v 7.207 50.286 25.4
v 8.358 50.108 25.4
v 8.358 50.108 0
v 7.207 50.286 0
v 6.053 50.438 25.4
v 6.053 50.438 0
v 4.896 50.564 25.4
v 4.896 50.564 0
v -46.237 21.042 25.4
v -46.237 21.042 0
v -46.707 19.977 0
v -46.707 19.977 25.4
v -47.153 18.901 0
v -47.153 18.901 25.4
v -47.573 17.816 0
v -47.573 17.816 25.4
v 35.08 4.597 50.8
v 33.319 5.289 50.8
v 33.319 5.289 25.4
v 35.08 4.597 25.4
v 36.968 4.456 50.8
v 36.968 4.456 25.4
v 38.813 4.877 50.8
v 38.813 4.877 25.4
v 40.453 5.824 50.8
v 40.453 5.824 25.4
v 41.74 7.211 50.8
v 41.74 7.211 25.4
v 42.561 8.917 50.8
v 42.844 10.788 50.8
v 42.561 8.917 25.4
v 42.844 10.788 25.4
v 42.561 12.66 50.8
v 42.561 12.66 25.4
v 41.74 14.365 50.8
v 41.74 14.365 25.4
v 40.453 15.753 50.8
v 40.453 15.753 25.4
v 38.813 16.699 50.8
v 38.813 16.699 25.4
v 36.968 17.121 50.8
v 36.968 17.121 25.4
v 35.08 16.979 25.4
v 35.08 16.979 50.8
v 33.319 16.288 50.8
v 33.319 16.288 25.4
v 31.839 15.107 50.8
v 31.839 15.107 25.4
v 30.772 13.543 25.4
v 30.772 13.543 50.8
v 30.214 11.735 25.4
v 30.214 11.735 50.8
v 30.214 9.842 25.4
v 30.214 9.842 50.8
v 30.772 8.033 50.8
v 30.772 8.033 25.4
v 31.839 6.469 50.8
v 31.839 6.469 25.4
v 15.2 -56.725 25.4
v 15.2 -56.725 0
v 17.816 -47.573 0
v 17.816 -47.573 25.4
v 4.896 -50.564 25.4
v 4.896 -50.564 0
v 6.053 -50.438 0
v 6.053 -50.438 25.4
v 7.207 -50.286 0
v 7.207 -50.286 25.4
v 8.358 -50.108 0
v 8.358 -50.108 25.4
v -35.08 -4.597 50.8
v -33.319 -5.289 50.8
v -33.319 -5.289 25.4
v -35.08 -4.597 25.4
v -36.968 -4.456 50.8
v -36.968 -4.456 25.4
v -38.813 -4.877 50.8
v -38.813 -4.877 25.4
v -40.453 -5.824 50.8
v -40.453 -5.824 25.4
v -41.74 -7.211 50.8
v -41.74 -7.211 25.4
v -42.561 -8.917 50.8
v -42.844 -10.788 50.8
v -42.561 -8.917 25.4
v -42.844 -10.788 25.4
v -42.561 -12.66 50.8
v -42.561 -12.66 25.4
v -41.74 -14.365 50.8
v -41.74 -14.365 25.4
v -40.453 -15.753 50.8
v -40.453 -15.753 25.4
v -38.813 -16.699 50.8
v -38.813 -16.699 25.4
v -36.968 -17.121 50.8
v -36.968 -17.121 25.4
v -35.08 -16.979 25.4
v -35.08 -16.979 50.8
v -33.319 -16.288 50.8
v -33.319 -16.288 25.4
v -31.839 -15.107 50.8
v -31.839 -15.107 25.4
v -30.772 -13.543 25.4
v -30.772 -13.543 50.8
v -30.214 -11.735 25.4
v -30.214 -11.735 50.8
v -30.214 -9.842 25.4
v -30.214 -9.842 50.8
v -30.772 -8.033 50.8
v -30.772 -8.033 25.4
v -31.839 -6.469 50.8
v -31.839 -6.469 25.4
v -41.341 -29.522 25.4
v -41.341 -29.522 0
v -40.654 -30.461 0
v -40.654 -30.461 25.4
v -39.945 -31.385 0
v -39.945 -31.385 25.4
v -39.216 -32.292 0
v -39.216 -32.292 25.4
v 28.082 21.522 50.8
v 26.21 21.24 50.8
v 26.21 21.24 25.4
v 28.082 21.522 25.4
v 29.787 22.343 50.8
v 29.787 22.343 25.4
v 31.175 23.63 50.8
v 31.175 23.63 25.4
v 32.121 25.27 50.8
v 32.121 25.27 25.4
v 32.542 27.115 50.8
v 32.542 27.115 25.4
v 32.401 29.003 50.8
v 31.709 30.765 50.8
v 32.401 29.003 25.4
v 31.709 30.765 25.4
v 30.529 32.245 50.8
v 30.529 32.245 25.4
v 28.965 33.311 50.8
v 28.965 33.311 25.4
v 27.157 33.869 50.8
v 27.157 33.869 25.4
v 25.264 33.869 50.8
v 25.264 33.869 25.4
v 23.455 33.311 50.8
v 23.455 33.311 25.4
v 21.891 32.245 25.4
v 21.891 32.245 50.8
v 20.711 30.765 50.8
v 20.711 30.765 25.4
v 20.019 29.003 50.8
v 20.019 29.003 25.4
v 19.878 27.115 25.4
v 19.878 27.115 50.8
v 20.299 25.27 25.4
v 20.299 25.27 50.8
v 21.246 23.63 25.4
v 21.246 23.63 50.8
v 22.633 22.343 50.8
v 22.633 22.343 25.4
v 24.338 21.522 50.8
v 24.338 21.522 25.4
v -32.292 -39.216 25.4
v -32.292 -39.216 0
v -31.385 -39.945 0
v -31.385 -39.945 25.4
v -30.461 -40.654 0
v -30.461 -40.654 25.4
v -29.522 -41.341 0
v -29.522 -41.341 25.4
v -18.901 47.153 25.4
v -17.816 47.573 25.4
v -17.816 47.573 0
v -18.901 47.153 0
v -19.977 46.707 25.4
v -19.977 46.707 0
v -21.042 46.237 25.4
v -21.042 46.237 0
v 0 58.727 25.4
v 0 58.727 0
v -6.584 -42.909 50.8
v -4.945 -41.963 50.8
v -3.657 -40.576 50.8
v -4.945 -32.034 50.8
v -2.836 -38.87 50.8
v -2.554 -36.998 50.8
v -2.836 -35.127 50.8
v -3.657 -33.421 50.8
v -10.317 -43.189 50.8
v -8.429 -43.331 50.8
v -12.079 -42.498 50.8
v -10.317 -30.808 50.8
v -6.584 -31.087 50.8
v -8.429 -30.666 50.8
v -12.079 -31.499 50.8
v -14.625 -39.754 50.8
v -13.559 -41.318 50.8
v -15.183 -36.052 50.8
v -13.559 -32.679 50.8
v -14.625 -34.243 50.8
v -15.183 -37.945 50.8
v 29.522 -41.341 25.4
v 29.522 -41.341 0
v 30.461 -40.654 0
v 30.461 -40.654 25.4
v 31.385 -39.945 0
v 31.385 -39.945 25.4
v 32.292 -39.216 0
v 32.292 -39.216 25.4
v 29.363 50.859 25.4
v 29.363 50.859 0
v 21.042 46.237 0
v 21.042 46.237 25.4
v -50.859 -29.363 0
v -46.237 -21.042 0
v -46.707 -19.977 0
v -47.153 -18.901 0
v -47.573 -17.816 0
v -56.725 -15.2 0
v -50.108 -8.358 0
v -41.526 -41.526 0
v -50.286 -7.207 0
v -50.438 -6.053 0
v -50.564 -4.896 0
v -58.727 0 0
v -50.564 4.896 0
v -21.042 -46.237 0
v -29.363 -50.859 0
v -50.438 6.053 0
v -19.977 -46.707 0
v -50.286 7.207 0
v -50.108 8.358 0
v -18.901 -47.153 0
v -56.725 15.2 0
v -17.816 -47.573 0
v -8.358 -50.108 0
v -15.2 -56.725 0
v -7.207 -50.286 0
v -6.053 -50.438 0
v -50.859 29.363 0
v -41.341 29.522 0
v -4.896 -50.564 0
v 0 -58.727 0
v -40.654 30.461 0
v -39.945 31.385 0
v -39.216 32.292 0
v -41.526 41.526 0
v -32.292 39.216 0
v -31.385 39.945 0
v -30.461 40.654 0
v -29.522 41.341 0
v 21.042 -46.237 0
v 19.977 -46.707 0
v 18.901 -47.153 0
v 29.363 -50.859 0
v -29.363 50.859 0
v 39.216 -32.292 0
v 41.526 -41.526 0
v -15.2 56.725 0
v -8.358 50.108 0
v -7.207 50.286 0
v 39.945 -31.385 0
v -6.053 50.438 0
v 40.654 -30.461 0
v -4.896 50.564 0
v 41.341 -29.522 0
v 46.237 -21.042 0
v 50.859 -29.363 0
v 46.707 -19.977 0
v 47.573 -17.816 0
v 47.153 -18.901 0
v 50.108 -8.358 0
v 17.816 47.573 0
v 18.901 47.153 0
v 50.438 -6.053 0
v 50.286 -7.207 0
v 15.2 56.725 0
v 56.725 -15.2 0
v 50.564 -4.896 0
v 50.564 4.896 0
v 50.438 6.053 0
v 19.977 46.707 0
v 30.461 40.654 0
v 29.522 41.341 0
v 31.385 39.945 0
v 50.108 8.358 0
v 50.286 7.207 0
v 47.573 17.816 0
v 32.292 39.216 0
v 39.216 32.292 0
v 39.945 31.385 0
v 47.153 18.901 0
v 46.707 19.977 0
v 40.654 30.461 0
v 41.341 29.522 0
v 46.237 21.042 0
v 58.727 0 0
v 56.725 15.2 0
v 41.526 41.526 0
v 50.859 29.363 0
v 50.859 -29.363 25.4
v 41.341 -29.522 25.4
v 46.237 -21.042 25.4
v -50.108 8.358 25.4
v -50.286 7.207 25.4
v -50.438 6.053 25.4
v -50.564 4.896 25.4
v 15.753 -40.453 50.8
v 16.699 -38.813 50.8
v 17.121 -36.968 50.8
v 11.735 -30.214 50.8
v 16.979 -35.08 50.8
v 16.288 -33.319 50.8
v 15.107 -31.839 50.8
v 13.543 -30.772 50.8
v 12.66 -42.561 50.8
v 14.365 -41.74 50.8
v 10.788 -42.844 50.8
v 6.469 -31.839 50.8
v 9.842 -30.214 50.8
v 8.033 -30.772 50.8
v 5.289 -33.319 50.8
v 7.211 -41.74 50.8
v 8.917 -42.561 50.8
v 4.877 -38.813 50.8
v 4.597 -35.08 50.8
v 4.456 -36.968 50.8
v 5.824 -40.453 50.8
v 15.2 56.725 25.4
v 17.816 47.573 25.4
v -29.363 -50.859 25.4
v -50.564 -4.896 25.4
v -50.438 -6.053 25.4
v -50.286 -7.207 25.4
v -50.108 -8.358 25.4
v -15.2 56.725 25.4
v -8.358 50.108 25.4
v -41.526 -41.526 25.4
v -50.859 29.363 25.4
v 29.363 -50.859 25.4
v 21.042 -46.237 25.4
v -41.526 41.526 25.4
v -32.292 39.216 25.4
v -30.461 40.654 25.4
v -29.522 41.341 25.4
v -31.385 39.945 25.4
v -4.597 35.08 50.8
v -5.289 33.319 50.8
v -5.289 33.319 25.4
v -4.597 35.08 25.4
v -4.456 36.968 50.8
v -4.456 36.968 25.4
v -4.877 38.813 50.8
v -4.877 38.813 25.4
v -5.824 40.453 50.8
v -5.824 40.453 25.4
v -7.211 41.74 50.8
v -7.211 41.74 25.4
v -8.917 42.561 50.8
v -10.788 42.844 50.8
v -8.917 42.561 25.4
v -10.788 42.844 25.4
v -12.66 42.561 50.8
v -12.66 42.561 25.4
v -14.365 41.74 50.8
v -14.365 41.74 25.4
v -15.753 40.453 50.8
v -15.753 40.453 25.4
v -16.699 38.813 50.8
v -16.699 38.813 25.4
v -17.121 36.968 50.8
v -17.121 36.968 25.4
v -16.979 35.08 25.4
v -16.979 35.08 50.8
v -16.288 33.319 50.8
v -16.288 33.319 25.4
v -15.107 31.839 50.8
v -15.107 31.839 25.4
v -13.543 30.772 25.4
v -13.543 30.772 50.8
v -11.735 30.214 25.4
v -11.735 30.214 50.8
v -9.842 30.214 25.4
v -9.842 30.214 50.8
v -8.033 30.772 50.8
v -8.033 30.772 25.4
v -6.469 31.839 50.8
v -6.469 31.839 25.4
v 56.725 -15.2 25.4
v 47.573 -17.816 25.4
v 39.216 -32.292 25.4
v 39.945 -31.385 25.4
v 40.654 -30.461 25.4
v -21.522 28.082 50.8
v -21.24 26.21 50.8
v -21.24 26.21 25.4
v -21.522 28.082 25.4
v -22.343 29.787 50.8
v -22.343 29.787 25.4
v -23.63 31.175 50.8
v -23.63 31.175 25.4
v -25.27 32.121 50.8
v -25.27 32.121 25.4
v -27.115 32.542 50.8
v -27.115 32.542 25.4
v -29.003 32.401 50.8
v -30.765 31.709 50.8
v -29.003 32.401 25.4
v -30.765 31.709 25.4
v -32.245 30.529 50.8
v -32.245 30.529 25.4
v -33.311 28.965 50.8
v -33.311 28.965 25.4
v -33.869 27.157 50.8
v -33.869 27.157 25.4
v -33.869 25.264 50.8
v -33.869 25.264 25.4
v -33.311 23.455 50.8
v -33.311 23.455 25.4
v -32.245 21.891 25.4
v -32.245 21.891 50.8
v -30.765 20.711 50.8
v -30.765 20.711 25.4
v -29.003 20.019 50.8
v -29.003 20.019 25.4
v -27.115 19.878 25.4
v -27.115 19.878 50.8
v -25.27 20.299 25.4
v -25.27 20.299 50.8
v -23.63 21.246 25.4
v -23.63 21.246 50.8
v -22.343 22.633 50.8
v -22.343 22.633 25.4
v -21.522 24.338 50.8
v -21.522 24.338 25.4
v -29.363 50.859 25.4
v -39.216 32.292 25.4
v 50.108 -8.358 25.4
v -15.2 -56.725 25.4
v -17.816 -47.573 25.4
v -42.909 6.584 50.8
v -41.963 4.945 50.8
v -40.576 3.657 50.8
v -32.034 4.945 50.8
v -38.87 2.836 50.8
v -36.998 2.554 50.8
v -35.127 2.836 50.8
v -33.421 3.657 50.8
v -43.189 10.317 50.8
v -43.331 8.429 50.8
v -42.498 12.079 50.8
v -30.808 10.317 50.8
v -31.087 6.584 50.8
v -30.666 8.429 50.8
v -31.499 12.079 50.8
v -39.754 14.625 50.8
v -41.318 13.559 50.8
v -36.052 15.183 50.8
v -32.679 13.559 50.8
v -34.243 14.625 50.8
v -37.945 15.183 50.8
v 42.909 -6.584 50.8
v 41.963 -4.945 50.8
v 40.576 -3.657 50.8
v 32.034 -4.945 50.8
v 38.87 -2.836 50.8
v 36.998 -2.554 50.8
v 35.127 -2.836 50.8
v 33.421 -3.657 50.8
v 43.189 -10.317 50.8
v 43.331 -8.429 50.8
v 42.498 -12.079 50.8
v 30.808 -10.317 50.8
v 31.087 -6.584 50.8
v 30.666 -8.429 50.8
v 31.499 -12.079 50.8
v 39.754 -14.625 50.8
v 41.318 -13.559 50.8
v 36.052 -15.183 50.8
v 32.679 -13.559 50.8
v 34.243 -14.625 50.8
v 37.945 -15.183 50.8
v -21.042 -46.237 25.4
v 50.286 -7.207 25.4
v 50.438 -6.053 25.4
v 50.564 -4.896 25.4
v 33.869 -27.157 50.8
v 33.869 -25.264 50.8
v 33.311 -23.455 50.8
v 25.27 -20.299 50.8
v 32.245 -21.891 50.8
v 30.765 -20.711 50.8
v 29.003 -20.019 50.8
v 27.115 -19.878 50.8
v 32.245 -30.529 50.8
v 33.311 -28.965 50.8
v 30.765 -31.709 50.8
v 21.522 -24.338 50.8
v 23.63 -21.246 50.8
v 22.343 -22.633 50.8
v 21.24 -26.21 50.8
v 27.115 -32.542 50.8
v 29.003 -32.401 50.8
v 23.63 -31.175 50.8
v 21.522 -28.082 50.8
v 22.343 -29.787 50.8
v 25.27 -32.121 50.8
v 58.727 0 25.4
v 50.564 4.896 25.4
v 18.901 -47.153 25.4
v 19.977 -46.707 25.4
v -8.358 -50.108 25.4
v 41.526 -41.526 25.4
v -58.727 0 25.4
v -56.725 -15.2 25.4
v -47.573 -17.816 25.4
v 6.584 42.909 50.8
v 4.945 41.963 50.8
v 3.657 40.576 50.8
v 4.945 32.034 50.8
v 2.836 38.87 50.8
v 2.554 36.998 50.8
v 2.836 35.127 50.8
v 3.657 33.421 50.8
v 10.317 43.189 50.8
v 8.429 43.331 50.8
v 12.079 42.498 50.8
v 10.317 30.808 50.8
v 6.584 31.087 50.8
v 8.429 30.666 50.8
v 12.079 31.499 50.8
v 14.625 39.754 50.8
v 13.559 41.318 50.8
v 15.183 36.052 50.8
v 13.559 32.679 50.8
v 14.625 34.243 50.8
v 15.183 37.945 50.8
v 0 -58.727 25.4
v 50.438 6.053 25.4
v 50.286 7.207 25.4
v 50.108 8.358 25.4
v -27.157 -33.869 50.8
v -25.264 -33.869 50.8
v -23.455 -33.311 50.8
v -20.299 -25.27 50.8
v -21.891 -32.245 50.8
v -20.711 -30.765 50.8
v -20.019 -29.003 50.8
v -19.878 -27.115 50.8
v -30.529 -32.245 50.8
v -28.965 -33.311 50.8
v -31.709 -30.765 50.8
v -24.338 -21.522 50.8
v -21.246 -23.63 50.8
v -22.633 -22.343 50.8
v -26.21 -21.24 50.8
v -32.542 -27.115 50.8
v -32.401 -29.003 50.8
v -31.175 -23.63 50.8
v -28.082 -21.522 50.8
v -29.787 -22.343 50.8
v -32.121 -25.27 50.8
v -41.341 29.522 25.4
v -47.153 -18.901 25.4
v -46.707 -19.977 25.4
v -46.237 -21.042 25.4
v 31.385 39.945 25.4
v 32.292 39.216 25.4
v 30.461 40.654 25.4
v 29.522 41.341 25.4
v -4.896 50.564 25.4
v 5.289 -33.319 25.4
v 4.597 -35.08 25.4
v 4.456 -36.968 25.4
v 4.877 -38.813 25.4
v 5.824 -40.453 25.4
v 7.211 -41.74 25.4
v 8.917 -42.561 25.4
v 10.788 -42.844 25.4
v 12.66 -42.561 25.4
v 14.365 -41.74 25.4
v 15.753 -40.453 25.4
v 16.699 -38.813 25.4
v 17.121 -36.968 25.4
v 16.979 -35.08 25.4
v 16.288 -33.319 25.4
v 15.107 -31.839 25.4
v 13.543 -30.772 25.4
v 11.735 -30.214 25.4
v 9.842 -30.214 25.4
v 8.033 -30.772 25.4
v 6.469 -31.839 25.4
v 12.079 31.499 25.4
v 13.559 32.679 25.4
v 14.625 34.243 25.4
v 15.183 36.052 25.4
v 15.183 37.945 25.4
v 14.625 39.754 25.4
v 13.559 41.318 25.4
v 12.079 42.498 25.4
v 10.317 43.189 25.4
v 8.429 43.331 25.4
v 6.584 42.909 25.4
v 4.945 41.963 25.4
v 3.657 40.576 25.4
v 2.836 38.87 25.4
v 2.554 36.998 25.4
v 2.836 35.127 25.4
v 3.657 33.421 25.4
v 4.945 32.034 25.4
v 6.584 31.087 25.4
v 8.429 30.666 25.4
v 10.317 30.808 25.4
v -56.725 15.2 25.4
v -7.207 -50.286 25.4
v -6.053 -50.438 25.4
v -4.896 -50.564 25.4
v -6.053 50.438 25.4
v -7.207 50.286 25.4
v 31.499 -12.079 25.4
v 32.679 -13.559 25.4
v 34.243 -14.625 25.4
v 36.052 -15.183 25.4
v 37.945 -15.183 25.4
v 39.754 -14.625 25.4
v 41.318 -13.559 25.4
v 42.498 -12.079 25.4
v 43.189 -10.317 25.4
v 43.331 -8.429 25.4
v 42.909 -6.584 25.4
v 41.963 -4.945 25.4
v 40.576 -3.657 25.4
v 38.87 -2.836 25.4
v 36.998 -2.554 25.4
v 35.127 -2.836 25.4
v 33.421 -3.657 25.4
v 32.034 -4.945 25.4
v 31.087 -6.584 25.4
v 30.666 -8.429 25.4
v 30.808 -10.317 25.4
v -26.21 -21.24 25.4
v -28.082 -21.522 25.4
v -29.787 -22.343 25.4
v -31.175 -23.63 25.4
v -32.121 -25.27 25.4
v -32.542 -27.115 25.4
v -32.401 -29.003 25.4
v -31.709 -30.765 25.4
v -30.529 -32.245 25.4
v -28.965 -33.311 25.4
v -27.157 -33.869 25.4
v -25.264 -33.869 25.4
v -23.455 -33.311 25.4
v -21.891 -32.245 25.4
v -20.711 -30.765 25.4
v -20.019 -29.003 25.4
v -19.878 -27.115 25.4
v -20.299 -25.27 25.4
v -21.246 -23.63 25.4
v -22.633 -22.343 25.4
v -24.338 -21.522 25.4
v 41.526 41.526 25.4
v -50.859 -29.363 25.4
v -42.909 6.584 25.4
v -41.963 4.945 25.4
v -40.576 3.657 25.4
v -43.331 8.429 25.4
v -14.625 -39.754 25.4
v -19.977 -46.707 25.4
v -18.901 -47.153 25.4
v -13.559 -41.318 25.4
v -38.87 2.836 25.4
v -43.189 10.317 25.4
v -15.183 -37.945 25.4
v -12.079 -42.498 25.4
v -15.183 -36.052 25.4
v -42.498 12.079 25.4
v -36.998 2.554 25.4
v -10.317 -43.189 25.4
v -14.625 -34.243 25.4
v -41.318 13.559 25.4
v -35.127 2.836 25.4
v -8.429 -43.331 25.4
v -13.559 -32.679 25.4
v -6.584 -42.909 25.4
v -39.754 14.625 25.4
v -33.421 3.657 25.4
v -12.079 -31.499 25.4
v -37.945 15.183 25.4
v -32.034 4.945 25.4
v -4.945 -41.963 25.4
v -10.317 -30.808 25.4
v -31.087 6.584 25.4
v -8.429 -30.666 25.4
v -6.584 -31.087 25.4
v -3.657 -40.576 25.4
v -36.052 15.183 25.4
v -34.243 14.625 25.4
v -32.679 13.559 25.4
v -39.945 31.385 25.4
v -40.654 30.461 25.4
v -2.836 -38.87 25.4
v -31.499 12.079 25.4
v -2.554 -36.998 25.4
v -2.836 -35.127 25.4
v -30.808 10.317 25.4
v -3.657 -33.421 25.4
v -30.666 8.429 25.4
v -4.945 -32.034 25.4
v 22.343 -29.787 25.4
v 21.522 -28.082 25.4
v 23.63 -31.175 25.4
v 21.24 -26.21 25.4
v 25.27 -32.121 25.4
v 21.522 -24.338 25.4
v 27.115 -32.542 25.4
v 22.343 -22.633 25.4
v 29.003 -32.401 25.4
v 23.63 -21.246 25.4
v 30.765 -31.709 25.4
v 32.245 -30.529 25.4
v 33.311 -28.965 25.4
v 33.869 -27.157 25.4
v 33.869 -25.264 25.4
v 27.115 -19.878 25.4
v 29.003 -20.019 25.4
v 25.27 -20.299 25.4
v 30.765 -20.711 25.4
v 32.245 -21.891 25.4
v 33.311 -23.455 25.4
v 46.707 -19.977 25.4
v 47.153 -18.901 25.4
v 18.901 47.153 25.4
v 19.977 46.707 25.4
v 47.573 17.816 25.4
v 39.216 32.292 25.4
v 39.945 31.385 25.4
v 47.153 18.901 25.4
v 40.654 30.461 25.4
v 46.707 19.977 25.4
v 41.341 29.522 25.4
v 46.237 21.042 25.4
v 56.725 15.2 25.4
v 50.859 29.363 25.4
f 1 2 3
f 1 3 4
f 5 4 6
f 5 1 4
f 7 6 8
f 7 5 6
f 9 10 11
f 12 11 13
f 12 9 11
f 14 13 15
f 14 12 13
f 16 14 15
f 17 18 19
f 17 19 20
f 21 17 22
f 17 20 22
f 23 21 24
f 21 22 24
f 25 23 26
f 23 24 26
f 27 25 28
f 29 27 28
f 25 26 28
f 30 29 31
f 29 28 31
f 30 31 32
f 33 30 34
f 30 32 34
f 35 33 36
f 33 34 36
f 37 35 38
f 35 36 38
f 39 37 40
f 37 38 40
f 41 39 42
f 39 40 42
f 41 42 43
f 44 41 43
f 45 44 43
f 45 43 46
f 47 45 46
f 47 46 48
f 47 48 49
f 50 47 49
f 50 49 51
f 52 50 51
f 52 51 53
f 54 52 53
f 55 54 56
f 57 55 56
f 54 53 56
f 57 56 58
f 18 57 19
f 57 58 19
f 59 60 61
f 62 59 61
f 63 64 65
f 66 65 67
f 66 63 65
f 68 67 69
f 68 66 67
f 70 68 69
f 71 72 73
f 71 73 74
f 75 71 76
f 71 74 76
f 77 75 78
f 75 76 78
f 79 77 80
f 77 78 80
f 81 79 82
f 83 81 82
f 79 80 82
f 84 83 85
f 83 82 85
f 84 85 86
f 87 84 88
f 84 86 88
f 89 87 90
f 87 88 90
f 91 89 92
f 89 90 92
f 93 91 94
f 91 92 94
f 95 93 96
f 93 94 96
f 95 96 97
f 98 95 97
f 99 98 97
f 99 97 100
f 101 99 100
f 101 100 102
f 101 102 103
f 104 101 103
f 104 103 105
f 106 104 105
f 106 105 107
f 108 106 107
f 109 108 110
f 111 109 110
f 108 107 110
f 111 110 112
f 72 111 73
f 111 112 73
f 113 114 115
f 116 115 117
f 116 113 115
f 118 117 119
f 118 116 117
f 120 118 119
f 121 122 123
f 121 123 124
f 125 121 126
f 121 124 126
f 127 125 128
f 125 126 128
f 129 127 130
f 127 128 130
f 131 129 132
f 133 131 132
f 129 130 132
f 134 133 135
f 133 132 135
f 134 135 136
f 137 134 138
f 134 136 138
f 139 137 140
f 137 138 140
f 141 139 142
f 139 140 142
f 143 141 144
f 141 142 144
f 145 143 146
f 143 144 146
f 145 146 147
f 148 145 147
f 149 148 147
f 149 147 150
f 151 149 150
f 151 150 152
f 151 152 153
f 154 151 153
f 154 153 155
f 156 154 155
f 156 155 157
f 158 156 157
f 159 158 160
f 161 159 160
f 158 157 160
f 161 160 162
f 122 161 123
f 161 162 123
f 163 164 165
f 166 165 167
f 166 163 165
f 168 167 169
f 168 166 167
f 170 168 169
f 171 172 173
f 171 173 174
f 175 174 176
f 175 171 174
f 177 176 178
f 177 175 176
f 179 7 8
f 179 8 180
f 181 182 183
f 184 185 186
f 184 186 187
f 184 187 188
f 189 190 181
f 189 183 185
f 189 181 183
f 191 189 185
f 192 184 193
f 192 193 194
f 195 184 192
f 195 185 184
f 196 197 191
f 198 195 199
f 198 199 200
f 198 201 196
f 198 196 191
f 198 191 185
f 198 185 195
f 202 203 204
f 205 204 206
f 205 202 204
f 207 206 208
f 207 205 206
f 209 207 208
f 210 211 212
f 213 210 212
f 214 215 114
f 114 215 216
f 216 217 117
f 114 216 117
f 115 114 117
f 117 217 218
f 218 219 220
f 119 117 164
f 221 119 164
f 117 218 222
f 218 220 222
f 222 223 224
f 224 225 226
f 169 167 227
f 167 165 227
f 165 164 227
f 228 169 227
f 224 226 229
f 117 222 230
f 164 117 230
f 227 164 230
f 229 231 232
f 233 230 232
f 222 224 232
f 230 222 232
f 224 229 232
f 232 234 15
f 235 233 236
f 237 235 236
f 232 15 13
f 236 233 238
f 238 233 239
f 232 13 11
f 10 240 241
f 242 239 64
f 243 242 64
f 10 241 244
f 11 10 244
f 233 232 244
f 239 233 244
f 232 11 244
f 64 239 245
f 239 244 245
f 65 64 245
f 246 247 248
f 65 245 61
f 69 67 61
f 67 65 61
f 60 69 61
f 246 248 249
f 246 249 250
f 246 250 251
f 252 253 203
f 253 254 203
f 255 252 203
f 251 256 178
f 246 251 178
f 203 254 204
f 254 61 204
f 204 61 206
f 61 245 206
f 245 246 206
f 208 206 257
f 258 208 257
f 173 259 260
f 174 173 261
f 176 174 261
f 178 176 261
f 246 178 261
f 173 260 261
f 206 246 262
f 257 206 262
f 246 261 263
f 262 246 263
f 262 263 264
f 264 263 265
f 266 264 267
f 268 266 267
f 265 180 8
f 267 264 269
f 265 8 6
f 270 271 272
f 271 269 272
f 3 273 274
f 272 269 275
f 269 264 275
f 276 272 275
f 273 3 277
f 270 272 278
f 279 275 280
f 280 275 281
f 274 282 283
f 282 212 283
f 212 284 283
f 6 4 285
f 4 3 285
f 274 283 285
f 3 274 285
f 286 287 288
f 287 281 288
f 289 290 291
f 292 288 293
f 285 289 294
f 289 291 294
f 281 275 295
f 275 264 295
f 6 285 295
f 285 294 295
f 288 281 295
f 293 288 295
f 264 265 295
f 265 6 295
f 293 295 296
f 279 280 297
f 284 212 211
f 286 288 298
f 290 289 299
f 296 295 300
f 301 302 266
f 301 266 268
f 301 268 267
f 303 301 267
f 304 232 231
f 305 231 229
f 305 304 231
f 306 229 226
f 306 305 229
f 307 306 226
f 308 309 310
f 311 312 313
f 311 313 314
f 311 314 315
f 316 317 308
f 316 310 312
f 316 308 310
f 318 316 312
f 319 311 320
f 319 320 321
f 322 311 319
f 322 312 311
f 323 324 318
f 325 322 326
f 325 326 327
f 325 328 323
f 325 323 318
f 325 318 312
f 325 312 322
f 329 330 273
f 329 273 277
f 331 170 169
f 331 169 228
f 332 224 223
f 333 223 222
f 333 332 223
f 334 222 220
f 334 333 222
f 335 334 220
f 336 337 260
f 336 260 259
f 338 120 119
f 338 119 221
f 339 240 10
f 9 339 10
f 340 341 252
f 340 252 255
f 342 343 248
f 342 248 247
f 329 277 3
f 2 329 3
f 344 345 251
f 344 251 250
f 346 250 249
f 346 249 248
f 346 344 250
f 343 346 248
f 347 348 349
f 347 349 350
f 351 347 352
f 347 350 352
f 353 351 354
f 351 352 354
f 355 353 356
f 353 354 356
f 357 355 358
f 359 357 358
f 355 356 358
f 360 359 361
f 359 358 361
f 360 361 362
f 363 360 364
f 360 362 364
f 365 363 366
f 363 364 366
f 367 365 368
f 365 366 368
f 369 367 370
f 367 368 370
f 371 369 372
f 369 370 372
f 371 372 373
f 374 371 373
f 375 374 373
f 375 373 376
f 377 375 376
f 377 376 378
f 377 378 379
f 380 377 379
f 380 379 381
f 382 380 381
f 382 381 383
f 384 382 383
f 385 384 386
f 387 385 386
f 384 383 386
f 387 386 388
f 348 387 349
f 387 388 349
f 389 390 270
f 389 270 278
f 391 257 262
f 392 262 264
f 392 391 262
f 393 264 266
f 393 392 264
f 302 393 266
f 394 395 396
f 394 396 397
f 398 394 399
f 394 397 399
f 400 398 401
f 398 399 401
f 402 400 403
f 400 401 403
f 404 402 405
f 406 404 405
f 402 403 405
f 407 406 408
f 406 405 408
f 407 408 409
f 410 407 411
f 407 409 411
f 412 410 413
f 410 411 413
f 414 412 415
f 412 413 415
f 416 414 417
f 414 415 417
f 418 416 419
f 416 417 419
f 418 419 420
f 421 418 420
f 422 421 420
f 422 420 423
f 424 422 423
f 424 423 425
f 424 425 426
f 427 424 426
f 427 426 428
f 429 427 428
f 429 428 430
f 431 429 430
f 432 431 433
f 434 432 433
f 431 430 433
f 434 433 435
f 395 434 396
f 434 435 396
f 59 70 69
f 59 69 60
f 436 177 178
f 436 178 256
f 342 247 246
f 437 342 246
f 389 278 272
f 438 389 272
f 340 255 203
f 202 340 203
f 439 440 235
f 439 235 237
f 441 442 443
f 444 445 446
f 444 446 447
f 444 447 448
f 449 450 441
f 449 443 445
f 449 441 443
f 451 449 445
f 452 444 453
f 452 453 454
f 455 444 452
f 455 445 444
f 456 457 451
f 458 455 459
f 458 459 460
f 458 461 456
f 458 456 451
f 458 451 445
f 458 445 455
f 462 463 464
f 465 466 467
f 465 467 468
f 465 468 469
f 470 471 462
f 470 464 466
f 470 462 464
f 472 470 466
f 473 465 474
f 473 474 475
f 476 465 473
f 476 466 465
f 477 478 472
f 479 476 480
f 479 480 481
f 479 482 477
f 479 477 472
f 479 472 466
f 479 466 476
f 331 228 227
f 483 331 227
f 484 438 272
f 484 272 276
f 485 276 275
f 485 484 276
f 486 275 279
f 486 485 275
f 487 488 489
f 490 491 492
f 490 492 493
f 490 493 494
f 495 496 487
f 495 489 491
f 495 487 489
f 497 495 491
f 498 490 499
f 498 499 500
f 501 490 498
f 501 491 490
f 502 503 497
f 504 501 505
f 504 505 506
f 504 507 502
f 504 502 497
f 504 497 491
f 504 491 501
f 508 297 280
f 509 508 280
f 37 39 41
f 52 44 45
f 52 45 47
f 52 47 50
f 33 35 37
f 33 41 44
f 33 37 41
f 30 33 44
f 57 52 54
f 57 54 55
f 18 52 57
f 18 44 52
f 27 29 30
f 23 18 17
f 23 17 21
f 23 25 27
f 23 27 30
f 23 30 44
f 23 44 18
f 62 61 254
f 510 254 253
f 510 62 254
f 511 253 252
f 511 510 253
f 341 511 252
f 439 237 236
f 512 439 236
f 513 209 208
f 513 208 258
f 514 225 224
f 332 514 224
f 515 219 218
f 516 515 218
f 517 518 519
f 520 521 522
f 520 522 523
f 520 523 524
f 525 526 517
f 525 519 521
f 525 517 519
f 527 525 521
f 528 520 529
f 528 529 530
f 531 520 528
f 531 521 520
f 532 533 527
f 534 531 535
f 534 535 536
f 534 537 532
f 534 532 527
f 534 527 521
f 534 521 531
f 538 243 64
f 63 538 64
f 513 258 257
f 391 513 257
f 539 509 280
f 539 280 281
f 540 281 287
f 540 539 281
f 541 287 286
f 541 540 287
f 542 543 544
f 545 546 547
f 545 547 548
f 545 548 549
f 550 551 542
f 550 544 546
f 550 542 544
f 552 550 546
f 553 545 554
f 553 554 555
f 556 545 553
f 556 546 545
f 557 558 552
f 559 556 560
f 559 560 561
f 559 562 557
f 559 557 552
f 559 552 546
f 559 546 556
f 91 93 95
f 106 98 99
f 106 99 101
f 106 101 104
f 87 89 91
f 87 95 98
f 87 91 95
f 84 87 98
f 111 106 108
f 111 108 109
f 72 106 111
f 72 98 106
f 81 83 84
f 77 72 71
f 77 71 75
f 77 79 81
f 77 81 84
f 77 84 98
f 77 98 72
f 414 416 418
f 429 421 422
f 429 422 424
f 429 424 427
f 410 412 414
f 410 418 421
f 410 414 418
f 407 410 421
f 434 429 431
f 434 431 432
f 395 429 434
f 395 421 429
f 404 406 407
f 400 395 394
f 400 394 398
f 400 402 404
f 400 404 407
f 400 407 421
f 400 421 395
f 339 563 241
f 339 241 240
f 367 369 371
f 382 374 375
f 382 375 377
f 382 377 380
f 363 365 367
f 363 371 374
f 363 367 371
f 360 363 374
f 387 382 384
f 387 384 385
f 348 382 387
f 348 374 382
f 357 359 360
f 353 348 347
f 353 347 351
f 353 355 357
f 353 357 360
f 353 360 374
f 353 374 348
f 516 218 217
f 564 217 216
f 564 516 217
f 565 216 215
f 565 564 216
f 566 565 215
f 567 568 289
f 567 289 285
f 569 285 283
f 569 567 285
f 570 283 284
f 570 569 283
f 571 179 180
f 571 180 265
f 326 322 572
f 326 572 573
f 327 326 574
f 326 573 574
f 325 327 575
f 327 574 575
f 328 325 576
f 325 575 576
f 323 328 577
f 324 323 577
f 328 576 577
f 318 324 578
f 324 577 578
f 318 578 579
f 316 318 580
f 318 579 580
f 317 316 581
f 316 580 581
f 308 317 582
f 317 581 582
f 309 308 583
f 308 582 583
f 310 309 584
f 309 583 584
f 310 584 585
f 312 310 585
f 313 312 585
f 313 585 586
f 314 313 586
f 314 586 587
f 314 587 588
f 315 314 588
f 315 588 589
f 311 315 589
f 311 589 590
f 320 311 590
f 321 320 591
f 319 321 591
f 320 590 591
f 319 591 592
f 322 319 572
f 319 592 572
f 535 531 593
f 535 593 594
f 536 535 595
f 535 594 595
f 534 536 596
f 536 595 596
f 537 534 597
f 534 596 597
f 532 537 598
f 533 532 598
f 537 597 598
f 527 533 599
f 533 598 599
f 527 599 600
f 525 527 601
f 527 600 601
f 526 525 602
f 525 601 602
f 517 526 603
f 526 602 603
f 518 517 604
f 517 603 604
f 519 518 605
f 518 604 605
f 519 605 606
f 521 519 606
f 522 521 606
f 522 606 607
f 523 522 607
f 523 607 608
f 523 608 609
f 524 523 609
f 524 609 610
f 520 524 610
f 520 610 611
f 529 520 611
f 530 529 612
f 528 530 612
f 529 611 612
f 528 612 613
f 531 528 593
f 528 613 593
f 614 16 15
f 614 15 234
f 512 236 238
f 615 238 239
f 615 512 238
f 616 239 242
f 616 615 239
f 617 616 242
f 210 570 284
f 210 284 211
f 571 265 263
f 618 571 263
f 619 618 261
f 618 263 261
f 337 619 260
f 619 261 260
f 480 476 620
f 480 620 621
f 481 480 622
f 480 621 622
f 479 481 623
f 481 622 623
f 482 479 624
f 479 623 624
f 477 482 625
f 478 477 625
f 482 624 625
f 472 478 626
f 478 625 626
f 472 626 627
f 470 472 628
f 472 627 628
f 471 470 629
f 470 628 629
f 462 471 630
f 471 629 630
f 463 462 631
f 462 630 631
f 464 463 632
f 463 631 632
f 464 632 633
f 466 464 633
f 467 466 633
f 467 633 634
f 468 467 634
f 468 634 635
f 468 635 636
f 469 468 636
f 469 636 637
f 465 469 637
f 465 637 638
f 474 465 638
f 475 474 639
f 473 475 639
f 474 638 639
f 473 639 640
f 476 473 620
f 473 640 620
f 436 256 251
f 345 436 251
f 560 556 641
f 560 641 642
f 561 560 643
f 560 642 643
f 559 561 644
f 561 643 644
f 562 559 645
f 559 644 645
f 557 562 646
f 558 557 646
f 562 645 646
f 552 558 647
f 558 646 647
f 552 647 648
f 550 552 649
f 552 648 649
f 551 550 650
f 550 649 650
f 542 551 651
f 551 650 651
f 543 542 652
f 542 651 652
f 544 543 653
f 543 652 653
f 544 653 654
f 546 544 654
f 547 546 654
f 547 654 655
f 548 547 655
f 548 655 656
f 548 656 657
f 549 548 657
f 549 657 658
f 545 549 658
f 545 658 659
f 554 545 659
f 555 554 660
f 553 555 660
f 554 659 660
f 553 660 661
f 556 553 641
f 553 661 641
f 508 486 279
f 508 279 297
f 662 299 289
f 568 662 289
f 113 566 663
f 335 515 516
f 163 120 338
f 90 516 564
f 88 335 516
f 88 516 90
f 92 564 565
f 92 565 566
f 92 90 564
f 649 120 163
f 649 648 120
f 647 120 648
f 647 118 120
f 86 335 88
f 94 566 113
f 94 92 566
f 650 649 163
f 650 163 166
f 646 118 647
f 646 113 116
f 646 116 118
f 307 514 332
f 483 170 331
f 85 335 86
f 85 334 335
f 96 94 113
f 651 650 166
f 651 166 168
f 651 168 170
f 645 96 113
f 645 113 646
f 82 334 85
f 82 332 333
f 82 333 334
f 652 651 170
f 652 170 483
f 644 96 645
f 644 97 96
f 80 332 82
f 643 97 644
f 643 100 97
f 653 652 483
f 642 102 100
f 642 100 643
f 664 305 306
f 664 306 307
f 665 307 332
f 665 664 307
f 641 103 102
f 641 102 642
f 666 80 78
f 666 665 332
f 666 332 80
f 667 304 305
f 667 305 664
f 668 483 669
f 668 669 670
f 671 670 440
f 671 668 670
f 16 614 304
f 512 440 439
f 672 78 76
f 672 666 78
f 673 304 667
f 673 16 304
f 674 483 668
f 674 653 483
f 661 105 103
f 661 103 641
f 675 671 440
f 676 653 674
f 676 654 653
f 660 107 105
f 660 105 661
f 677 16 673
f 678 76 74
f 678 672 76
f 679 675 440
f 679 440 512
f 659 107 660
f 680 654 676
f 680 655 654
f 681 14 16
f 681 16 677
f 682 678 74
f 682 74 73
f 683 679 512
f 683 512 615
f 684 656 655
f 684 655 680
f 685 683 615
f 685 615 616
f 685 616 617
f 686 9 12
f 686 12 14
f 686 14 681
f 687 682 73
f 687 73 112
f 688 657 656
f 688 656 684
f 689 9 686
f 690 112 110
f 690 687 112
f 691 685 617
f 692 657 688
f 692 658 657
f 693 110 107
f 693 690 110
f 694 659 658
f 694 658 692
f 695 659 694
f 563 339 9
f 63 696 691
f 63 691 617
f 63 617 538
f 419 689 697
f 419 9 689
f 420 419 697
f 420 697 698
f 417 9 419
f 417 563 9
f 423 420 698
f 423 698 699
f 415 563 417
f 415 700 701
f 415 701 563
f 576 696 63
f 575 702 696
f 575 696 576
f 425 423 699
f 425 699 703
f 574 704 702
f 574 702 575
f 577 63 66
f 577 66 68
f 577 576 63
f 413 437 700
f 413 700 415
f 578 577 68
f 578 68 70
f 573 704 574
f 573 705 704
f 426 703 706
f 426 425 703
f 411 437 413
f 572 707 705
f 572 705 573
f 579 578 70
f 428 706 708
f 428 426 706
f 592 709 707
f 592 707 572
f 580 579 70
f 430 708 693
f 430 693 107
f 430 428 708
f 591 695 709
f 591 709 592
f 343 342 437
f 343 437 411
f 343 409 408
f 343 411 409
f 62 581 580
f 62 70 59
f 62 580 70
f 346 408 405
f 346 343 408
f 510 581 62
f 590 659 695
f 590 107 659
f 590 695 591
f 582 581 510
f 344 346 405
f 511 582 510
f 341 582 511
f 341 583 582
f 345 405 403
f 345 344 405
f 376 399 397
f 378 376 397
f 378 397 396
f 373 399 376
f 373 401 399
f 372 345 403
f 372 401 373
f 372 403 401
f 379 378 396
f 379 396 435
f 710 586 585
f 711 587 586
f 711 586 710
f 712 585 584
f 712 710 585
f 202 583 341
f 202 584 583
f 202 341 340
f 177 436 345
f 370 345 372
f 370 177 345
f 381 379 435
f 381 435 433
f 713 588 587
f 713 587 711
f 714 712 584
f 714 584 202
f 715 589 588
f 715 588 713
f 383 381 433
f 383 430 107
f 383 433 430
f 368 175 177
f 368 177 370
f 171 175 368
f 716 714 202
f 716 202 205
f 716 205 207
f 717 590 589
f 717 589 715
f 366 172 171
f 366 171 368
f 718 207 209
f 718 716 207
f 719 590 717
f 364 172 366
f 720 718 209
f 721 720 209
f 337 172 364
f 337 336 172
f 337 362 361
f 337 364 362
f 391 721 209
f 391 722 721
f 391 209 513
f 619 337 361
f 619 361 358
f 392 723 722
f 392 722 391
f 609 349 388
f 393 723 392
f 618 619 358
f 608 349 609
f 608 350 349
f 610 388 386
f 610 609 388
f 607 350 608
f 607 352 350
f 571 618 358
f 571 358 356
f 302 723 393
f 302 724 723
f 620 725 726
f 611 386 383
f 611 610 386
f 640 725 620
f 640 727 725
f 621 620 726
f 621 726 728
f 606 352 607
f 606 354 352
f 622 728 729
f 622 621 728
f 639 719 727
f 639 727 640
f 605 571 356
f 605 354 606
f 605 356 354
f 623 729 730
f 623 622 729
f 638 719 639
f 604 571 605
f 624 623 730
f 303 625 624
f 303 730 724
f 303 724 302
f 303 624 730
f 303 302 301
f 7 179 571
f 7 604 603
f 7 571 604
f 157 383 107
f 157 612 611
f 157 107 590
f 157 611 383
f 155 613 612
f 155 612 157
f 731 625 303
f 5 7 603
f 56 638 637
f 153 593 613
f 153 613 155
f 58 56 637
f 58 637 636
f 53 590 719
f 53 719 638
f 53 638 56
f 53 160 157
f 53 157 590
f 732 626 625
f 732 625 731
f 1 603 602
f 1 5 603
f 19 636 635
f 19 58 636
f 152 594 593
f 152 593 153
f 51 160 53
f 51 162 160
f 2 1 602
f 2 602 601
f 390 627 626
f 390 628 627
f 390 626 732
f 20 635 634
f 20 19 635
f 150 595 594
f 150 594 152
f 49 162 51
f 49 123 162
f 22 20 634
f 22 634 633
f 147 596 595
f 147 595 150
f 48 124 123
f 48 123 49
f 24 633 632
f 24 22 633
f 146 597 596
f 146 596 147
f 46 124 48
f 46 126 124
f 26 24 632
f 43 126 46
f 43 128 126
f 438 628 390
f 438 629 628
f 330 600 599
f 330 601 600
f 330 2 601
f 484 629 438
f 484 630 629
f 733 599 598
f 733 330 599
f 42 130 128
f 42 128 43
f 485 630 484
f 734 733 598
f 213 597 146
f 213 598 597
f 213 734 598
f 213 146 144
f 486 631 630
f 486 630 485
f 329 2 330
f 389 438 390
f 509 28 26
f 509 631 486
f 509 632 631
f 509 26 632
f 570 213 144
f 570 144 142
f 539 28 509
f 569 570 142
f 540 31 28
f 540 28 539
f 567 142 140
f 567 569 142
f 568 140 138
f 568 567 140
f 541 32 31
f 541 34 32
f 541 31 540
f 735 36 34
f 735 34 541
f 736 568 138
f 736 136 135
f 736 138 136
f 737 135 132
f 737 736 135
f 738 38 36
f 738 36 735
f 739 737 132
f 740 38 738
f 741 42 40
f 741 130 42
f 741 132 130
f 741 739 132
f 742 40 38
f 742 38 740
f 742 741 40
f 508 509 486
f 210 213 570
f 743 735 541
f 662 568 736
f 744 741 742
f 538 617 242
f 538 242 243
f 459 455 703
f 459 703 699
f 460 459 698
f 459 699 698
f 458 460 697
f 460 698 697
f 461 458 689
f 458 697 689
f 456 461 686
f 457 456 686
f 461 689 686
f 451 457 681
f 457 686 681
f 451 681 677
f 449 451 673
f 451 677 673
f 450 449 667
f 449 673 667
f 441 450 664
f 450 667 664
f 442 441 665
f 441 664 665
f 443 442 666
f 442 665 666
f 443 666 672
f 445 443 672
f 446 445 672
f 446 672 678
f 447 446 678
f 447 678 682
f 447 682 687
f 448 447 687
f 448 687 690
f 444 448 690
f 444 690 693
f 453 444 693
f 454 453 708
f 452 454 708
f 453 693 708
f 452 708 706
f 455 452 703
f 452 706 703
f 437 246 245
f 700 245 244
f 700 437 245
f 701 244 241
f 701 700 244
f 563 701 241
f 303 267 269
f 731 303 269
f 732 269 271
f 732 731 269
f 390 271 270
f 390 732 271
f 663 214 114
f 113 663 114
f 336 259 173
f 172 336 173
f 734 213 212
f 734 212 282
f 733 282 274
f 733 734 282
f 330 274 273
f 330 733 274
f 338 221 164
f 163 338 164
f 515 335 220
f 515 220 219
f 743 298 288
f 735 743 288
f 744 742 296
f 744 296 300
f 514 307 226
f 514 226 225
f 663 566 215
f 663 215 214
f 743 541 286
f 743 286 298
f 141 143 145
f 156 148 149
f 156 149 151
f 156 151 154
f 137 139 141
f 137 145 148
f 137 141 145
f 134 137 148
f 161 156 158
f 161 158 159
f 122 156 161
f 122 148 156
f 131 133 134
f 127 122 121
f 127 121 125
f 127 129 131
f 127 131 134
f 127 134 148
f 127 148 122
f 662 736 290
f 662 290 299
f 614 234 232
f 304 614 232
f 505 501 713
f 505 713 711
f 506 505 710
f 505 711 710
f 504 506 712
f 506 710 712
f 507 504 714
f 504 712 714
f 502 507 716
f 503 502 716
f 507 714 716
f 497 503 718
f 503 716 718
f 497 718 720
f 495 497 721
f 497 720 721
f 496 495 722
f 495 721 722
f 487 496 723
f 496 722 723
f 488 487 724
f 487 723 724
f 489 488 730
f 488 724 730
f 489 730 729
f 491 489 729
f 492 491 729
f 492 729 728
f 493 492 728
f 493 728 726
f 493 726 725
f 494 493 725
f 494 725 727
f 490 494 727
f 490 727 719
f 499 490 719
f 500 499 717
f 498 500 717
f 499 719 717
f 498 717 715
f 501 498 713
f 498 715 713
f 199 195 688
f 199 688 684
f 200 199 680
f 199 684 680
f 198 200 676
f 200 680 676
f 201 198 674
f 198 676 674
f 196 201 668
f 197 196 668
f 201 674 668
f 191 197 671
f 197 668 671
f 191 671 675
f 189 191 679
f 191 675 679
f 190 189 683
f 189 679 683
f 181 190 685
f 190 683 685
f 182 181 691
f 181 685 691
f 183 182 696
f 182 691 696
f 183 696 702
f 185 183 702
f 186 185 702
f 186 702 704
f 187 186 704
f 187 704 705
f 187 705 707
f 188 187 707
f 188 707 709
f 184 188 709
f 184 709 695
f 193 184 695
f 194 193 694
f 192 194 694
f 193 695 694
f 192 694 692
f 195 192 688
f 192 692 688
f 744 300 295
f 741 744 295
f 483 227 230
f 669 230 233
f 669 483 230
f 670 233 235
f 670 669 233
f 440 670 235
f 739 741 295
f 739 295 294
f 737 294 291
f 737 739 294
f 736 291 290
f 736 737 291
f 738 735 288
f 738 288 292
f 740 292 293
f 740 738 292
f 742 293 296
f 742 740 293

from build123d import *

# Parameters (mm, degrees)
F0_R            = 50.8
F1_DEPTH        = 25.4
F2_R            = 6.35
F3_DEPTH        = 25.4
F3_COPIES_COUNT = 12
F5_DEPTH        = 25.4
F5_COPIES_COUNT = 24


# Not quite as in the source:
# - a pattern or mirror of a feature is missing from the dataset's text; its kind, count and spacing are read off the source's solid


with BuildPart() as f1:
    # F0 (on Top) → F1 (new body)
    with BuildSketch(Plane.XY):
        Circle(F0_R)
    extrude(amount=F1_DEPTH)

    # F2 (on face) → F3 (join)
    with BuildSketch(Plane.XY.offset(25.4)):
        with Locations((-27.5896564126, 26.2101721019)):
            Circle(F2_R)
    f3 = extrude(amount=F3_DEPTH)

    # F3_copies: F3 ×12 about axis
    f3_copies_axis = Axis((0, 0, 0), (0, 0, 1))
    for i in range(1, F3_COPIES_COUNT):
        add(f3.rotate(f3_copies_axis, i * 360 / F3_COPIES_COUNT))

    # F4 (on face) → F5 (join)
    with BuildSketch(Plane.XY.offset(25.4)):
        with BuildLine():
            Line((4.8960702354, 50.5635095326), (0, 58.7265528738))
            Line((0, 58.7265528738), (-4.8960702354, 50.5635095326))
            ThreePointArc((-4.8960702354, 50.5635095326), (0, 50.8), (4.8960702354, 50.5635095326))
        make_face()
        with BuildLine():
            Line((4.8960702354, 50.5635095326), (-4.8960702354, 50.5635095326))
            ThreePointArc((-4.8960702354, 50.5635095326), (-34.1461537515, -37.6122344986), (50.8, 0))
            ThreePointArc((50.8, 0), (37.6122344986, 34.1461537515), (4.8960702354, 50.5635095326))
        make_face()
        with BuildLine():
            ThreePointArc((4.8960702354, 50.5635095326), (0, 50.8), (-4.8960702354, 50.5635095326))
            Line((-4.8960702354, 50.5635095326), (4.8960702354, 50.5635095326))
        make_face()
    f5 = extrude(amount=-F5_DEPTH)

    # F5_copies: F5 ×24 about axis
    f5_copies_axis = Axis((0, 0, 0), (0, 0, 1))
    for i in range(1, F5_COPIES_COUNT):
        add(f5.rotate(f5_copies_axis, i * 360 / F5_COPIES_COUNT))


solid = f1.part
